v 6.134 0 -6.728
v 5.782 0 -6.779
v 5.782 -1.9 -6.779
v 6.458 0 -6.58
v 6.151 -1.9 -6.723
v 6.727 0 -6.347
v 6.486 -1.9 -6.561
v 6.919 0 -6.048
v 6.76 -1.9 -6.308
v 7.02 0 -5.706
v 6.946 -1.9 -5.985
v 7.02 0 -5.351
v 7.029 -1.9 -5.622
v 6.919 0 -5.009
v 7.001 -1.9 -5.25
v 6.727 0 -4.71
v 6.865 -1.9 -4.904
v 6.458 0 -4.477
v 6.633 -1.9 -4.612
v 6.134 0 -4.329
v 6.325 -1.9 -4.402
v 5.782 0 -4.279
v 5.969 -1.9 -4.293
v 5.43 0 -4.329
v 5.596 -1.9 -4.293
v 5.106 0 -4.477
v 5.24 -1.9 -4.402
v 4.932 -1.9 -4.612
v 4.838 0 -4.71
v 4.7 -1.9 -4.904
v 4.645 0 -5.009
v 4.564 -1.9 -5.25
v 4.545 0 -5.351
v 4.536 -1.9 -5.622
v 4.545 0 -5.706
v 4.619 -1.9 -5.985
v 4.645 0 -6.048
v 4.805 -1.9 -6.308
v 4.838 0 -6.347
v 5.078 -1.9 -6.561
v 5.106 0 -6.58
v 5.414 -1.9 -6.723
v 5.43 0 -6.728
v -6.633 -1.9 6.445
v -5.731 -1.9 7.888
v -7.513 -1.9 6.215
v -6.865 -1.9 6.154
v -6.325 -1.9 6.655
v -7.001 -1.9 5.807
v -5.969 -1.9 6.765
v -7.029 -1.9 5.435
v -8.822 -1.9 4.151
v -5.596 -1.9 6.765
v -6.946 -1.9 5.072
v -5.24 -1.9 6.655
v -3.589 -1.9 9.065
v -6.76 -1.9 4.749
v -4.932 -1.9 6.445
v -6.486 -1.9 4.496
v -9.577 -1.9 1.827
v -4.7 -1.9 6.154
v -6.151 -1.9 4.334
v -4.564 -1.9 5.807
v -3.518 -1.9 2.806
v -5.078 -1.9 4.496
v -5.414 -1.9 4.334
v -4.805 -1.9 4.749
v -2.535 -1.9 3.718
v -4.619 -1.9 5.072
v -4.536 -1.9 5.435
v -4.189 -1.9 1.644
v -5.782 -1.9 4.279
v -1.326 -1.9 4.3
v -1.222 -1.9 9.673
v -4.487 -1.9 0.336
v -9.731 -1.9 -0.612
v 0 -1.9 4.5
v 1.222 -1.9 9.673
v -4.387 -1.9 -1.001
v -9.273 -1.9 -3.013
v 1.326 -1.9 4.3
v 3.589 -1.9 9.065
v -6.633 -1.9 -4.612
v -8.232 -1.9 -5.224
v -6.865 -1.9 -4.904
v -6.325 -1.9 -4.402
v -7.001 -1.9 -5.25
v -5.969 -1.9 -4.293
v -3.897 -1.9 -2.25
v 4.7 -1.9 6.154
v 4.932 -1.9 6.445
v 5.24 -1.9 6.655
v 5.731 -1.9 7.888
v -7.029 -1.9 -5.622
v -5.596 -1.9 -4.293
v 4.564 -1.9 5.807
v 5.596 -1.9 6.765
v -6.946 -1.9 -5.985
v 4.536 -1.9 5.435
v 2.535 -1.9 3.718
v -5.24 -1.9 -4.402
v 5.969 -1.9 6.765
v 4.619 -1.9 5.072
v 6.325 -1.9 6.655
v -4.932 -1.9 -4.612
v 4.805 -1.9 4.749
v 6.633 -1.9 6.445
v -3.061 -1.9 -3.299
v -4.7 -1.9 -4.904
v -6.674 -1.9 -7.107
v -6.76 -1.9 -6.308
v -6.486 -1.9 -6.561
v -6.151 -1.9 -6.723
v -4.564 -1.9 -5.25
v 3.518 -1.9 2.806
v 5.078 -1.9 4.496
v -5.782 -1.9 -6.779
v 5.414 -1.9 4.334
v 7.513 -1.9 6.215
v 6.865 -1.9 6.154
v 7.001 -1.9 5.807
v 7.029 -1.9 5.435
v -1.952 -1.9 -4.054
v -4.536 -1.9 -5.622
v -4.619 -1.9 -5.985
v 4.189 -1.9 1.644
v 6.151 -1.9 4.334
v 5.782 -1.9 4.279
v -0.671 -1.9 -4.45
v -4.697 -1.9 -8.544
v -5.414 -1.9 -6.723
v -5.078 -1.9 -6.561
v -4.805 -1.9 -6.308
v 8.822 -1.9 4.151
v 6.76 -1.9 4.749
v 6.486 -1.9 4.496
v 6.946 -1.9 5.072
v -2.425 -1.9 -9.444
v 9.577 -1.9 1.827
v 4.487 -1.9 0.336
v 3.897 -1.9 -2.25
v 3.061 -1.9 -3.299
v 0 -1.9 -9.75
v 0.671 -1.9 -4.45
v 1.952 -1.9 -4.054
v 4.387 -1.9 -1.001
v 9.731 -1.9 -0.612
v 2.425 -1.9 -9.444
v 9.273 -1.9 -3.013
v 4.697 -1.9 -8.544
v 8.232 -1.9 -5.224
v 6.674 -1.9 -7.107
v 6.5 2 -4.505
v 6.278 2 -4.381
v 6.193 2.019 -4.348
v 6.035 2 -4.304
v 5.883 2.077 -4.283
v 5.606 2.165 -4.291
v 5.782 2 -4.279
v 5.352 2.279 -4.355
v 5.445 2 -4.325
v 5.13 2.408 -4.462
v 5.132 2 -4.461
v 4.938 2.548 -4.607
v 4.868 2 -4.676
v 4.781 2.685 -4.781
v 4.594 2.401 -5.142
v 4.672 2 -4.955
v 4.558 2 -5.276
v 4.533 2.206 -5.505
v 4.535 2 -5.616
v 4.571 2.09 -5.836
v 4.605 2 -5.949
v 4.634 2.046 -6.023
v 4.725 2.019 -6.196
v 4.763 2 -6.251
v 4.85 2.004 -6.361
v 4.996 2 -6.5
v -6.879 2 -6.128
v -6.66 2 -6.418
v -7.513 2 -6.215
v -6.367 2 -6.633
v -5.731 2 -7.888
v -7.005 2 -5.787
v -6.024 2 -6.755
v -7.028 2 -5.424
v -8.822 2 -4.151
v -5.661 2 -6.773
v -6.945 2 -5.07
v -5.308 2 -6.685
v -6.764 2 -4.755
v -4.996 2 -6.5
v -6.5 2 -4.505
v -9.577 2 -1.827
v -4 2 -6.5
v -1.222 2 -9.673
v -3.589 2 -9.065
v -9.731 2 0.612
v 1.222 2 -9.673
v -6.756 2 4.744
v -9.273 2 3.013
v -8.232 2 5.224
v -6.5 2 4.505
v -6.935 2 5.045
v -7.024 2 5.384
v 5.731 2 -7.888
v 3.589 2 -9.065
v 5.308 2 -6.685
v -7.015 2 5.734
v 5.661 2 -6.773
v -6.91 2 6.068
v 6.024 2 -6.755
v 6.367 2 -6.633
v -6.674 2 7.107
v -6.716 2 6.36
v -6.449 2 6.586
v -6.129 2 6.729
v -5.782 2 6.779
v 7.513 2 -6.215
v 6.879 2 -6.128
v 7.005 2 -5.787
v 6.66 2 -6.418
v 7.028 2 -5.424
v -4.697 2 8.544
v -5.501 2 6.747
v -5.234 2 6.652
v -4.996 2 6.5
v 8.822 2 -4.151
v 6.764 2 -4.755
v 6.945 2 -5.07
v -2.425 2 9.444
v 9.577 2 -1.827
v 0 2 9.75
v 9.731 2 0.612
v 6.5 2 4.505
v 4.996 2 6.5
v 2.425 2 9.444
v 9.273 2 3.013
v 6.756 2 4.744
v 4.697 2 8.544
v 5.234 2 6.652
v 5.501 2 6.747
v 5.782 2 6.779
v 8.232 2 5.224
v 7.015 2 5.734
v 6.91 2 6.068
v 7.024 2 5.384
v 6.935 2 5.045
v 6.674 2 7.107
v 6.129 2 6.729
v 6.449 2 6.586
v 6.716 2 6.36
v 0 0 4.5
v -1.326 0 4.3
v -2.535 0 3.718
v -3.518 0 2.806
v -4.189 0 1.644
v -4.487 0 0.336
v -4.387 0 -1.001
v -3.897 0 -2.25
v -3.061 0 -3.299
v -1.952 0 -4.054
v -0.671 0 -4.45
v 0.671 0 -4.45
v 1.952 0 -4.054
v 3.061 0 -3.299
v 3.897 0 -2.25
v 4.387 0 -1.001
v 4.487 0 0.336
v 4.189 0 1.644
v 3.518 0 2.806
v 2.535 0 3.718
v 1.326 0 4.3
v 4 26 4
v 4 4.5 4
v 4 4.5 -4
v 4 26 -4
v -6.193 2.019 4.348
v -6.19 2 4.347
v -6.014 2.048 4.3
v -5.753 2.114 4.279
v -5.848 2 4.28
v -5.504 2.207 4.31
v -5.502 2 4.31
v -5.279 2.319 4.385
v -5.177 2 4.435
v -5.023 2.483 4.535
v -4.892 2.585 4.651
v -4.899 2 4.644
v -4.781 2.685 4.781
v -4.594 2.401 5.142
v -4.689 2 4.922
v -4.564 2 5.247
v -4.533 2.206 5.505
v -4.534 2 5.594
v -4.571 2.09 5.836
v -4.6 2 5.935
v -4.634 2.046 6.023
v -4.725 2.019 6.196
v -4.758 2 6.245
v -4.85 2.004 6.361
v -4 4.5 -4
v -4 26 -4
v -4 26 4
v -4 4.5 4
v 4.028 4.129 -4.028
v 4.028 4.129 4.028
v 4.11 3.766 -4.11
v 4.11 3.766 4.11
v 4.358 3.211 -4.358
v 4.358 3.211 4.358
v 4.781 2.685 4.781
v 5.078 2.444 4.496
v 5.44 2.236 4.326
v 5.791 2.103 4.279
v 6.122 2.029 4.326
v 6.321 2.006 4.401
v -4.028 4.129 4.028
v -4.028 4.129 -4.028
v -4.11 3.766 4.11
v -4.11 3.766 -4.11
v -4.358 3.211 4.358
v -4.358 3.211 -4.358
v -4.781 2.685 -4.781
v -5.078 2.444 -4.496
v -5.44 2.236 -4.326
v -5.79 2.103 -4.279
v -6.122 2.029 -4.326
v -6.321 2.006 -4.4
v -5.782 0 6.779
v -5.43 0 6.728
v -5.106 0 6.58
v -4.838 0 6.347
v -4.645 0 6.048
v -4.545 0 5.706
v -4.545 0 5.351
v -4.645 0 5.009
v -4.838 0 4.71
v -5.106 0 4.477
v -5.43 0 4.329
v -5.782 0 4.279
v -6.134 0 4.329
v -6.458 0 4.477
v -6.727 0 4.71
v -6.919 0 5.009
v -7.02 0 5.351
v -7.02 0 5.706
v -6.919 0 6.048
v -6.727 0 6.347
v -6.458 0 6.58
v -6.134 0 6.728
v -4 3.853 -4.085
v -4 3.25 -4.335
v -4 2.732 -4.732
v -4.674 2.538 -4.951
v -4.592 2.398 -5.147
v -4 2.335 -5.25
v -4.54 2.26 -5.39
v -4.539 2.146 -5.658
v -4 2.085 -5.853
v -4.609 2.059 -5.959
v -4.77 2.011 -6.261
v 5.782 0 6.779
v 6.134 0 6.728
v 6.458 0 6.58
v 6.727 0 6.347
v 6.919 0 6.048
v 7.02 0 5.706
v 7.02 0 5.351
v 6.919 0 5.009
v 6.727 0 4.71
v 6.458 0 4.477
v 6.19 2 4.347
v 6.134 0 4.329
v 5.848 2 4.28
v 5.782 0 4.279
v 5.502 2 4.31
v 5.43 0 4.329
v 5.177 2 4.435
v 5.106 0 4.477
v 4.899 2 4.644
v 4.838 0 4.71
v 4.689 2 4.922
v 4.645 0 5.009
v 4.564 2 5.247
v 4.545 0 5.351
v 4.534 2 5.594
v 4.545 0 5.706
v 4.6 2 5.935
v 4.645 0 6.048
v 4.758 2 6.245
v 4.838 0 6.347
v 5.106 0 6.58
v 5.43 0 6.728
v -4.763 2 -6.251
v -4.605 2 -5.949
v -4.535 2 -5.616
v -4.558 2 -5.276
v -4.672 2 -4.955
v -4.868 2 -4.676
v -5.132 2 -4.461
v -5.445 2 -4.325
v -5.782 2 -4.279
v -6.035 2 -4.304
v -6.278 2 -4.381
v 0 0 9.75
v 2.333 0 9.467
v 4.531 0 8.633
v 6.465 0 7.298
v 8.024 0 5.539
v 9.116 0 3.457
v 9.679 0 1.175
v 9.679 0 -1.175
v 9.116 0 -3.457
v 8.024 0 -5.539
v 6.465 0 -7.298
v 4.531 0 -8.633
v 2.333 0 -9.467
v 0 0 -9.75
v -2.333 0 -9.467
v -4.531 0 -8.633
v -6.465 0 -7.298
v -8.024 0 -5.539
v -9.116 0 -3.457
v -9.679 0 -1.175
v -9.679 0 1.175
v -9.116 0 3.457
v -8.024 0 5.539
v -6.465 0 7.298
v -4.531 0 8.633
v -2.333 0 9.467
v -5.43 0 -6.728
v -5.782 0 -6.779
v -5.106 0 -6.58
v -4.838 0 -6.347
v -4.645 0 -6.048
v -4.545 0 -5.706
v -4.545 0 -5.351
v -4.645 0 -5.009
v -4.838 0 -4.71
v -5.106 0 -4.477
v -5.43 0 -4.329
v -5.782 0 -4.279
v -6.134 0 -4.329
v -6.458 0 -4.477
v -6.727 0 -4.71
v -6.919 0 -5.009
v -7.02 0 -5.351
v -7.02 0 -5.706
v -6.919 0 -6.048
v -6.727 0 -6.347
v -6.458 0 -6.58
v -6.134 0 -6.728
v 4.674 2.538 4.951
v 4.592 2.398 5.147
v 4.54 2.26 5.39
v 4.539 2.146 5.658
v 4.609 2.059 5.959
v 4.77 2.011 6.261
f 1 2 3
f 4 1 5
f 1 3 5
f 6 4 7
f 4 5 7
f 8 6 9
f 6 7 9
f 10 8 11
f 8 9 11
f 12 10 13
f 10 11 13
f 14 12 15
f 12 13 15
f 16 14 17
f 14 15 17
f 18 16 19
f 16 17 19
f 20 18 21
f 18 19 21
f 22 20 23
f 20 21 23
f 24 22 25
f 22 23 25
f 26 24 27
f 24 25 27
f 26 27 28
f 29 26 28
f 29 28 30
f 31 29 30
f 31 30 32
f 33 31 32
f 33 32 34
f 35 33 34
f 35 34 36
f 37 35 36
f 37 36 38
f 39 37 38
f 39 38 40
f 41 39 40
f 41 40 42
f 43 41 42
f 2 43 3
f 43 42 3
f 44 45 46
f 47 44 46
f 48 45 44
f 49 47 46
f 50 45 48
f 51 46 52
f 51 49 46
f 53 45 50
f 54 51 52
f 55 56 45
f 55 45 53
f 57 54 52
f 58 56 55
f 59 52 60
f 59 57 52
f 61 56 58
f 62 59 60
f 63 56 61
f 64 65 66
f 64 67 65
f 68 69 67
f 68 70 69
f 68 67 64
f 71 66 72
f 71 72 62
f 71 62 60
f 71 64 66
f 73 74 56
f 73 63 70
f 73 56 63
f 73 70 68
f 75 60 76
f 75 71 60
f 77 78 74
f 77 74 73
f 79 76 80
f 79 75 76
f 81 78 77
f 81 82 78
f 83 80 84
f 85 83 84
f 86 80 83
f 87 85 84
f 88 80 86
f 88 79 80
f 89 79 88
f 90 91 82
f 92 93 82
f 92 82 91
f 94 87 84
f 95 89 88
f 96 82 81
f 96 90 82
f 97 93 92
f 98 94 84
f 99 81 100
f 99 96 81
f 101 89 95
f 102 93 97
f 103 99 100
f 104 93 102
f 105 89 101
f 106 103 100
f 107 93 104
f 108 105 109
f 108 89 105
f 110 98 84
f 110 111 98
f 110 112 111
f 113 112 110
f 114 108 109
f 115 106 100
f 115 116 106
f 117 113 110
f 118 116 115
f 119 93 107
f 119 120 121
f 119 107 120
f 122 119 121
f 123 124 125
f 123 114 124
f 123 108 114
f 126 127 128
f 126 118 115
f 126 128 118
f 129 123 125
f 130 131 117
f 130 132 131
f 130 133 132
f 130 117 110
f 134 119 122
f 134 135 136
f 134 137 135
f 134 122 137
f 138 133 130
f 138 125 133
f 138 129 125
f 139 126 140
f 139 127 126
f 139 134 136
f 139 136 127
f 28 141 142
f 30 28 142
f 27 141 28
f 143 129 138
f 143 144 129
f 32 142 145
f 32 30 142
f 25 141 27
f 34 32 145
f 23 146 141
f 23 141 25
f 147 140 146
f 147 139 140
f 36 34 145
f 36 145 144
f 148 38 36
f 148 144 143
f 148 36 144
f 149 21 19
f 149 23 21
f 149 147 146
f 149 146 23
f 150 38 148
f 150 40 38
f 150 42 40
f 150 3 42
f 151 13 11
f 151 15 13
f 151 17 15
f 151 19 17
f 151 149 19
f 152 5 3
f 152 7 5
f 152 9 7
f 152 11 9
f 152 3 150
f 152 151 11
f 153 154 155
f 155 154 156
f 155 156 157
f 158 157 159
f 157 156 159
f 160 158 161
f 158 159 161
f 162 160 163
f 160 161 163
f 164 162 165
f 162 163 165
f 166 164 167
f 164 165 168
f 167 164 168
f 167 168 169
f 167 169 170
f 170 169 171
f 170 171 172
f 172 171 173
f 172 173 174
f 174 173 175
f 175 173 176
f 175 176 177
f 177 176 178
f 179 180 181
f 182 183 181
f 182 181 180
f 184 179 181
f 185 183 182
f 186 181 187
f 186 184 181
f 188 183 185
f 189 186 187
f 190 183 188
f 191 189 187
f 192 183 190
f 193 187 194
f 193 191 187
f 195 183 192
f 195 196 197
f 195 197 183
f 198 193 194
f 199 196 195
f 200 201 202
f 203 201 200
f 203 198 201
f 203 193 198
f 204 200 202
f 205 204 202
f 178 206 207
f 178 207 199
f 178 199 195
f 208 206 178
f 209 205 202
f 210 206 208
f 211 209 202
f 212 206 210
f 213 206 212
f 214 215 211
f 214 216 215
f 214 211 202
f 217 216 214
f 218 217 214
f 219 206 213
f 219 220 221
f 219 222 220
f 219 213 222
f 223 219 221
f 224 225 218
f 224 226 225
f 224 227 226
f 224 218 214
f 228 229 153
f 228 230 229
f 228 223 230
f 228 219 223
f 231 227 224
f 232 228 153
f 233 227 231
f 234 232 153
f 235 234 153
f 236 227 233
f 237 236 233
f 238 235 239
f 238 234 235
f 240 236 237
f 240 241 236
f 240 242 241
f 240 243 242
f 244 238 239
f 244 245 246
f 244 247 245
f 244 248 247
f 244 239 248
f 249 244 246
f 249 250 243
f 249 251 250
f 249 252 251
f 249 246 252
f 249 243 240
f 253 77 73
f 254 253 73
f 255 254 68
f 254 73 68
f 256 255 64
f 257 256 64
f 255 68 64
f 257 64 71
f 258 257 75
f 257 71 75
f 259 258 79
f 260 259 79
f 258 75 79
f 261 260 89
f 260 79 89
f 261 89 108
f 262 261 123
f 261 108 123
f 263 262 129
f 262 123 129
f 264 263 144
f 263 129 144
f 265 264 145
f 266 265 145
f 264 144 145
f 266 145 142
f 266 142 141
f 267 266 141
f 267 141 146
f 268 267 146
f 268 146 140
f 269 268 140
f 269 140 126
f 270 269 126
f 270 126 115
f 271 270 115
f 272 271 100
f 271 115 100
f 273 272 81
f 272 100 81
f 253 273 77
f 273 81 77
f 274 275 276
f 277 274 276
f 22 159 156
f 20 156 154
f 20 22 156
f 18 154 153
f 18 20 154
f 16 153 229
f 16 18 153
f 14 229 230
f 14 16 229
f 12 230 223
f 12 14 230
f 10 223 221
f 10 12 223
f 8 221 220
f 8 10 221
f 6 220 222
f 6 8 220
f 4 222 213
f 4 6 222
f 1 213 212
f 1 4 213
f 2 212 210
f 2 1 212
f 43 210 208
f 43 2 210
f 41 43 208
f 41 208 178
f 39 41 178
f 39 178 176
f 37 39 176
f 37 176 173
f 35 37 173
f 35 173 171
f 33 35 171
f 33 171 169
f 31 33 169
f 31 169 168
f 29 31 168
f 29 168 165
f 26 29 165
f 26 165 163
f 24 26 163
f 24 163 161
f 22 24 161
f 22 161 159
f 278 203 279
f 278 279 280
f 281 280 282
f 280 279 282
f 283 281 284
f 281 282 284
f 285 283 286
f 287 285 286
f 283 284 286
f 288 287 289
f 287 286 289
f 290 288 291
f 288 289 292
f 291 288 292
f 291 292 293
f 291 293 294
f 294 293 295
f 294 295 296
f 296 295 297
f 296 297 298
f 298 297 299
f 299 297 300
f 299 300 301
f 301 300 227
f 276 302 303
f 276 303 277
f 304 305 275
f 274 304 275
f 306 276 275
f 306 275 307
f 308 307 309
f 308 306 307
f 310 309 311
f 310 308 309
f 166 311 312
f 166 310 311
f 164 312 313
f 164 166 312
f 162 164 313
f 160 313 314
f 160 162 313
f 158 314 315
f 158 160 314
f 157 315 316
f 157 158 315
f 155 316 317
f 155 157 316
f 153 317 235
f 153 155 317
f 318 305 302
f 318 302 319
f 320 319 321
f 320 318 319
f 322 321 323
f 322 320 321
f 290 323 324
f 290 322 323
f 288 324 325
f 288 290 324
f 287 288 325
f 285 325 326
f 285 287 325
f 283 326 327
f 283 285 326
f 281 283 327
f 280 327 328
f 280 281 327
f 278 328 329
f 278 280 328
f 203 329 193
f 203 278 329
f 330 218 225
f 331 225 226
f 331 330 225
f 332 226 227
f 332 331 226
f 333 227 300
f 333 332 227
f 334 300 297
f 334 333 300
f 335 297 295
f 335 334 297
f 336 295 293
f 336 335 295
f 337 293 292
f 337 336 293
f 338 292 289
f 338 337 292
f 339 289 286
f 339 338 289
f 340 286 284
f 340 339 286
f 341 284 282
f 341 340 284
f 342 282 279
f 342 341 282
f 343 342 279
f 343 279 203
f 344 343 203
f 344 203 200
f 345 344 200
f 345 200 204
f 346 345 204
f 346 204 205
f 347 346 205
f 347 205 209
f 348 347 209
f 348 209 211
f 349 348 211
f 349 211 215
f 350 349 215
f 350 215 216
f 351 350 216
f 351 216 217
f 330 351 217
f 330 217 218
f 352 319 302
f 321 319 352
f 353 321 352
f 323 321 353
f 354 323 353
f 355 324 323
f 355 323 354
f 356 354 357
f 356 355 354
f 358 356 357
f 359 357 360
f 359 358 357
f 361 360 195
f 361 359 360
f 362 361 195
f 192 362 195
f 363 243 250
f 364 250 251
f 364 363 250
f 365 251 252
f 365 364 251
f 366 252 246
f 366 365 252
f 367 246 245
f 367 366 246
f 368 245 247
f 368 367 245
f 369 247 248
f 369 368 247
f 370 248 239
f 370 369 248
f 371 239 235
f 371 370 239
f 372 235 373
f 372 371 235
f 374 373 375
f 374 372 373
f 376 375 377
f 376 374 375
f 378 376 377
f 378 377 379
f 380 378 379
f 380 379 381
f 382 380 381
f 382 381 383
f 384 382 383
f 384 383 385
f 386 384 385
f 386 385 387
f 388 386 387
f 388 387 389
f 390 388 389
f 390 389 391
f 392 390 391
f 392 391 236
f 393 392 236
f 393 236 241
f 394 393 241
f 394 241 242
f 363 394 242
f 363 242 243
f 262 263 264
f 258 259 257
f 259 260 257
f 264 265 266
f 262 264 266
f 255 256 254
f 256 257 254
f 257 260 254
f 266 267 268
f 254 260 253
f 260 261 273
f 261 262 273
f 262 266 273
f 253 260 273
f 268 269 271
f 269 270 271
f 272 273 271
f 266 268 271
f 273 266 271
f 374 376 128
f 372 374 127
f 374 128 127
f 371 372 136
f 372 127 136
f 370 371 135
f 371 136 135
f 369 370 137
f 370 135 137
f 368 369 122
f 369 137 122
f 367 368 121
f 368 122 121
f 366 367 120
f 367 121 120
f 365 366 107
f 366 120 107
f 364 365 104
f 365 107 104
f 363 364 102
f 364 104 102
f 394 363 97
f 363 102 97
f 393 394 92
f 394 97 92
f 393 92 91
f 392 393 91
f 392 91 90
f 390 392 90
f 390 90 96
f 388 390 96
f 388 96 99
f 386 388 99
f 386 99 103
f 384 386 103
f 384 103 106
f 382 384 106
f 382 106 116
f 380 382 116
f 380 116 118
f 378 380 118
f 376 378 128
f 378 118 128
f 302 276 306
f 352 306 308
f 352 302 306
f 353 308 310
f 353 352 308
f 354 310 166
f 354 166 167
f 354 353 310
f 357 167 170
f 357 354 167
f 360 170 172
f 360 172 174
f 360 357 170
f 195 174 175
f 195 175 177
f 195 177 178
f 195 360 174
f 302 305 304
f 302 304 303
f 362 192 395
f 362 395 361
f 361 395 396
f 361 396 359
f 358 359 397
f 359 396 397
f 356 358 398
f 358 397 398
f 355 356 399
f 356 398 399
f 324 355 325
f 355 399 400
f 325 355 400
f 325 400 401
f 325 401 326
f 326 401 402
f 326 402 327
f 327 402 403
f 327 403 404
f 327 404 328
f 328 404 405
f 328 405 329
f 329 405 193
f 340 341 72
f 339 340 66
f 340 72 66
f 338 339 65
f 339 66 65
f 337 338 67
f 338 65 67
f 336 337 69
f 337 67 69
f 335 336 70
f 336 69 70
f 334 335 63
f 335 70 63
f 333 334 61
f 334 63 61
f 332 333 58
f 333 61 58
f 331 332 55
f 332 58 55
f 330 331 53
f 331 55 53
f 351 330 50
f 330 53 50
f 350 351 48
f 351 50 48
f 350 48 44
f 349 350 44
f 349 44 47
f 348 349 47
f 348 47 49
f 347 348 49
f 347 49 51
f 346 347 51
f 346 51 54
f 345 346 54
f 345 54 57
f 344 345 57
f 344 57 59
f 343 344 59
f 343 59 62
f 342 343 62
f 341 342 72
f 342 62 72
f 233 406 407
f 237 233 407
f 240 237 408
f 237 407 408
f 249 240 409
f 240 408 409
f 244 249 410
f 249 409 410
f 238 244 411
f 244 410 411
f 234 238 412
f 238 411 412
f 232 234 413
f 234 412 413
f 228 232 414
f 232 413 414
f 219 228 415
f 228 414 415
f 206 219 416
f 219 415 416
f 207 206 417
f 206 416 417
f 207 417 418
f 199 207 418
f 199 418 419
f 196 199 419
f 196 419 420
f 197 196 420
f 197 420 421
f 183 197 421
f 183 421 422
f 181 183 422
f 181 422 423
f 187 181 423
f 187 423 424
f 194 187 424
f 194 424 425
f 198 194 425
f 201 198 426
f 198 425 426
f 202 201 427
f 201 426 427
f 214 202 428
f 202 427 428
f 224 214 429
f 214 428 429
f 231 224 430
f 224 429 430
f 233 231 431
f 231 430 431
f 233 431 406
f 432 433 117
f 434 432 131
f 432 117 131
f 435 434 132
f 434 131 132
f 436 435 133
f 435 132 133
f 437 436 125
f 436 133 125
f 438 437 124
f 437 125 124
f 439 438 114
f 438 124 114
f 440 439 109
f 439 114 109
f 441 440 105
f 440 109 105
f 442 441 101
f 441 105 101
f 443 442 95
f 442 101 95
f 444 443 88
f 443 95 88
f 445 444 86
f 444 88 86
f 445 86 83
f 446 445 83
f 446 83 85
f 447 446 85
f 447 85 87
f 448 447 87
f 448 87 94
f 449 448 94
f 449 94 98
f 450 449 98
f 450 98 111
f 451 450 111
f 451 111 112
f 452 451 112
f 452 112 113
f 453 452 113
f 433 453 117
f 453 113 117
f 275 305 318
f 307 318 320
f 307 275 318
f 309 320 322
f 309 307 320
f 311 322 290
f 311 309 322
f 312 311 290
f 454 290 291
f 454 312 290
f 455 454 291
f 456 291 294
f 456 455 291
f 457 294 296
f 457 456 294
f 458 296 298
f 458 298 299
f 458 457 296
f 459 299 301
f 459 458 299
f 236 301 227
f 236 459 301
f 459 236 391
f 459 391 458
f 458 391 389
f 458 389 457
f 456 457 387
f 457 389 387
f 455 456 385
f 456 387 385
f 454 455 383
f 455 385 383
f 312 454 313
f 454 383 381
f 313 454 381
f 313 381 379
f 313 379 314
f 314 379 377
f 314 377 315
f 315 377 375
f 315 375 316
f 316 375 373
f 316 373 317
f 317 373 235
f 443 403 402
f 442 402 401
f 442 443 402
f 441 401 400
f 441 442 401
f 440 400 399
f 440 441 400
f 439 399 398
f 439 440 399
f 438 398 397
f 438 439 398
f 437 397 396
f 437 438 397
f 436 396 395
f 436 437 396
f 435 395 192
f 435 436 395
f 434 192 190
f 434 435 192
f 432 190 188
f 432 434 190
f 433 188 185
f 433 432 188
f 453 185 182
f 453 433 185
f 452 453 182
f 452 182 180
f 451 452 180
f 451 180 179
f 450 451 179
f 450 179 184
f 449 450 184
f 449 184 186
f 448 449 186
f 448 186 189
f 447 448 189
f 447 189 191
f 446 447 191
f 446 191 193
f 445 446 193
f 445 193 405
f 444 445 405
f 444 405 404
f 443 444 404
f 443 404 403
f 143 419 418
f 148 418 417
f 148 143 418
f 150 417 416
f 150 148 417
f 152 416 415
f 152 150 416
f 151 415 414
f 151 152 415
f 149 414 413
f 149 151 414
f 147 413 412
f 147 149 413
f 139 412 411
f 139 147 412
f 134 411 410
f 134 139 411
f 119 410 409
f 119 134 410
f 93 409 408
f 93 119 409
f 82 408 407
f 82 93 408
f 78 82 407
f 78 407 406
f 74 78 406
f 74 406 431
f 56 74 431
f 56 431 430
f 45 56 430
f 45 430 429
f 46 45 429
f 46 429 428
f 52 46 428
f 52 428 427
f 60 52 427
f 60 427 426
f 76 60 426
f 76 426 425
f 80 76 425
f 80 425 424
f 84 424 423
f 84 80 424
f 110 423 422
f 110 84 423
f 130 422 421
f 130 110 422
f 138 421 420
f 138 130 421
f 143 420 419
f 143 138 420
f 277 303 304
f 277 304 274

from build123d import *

# Parameters (mm, degrees)
SKETCH1_R           = 9.75
SKETCH1_R_2         = 1.25
BOSS_EXTRUDE2_DEPTH = 2
SKETCH2_W           = 8
SKETCH2_H           = 8
BOSS_EXTRUDE3_DEPTH = 24
BOSS_EXTRUDE5_START = 1.9
SKETCH7_R           = 9.75
SKETCH7_R_2         = 4.5
SKETCH7_R_3         = 1.25
BOSS_EXTRUDE5_DEPTH = 1.9
FILLET1_R           = 2.5


with BuildPart() as part:
    # Sketch1 → Boss-Extrude2 (new body)
    with BuildSketch(Plane(origin=(0, 0, 0), x_dir=(1, 0, 0), z_dir=(0, 1, 0))):
        with Locations(Location((0, 0, 0), (0, 0, 270))):
            Circle(SKETCH1_R)
        with Locations(Location((-5.78230038, 5.52856241, 0), (0, 0, 270))):
            Circle(SKETCH1_R_2, mode=Mode.SUBTRACT)
        with Locations(Location((-5.78230038, -5.52856241, 0), (0, 0, 270))):
            Circle(SKETCH1_R_2, mode=Mode.SUBTRACT)
        with Locations(Location((5.78230038, -5.52856241, 0), (0, 0, 270))):
            Circle(SKETCH1_R_2, mode=Mode.SUBTRACT)
        with Locations(Location((5.78230038, 5.52856241, 0), (0, 0, 270))):
            Circle(SKETCH1_R_2, mode=Mode.SUBTRACT)
    extrude(amount=BOSS_EXTRUDE2_DEPTH)

    # Sketch2 → Boss-Extrude3 (add)
    with BuildSketch(Plane(origin=(0, 2, 0), x_dir=(1, 0, 0), z_dir=(0, 1, 0))):
        Rectangle(SKETCH2_W, SKETCH2_H)
    extrude(amount=BOSS_EXTRUDE3_DEPTH)

    # Sketch7 → Boss-Extrude5 (add)
    with BuildSketch(Plane.XZ.offset(BOSS_EXTRUDE5_START)):
        with Locations(Location((0, 0, 0), (0, 0, 270))):
            Circle(SKETCH7_R)
        with Locations(Location((0, 0, 0), (0, 0, 90))):
            Circle(SKETCH7_R_2, mode=Mode.SUBTRACT)
        with Locations(Location((-5.78230038, 5.52856241, 0), (0, 0, 270))):
            Circle(SKETCH7_R_3, mode=Mode.SUBTRACT)
        with Locations(Location((5.78230038, 5.52856241, 0), (0, 0, 270))):
            Circle(SKETCH7_R_3, mode=Mode.SUBTRACT)
        with Locations(Location((5.78230038, -5.52856241, 0), (0, 0, 270))):
            Circle(SKETCH7_R_3, mode=Mode.SUBTRACT)
        with Locations(Location((-5.78230038, -5.52856241, 0), (0, 0, 270))):
            Circle(SKETCH7_R_3, mode=Mode.SUBTRACT)
    extrude(amount=-BOSS_EXTRUDE5_DEPTH)

    # Fillet1
    # the kernel refuses this fillet: 2.5 mm, written as the material it adds along each edge
    with BuildSketch(Plane(origin=(4, 2, -4), x_dir=(1, 0, 0), z_dir=(0, 0, 1)), Plane(origin=(-4, 2, -4), x_dir=(0, 0, -1), z_dir=(1, 0, 0)), Plane(origin=(4, 2, 4), x_dir=(0, 0, 1), z_dir=(-1, 0, 0)), Plane(origin=(-4, 2, 4), x_dir=(-1, 0, 0), z_dir=(0, 0, -1))) as fillet1_piece_1:
        with BuildLine():
            CenterArc((FILLET1_R, FILLET1_R), FILLET1_R, 180, 90)
            Line((0, FILLET1_R), (0, 0))
            Line((0, 0), (FILLET1_R, 0))
        make_face()
    extrude(amount=8)
    with BuildSketch(Plane(origin=(4, 2, -10.25), x_dir=(1, 0, 0), z_dir=(0, 0, 1))) as fillet1_piece_2a_section:
        with BuildLine():
            CenterArc((FILLET1_R, FILLET1_R), FILLET1_R, 180, 90)
            Line((0, FILLET1_R), (0, 0))
            Line((0, 0), (FILLET1_R, 0))
        make_face()
    fillet1_piece_2a = extrude(amount=14.25, mode=Mode.PRIVATE)
    fillet1_piece_2a = fillet1_piece_2a & Plane(origin=(0, 2.663763666, 0), x_dir=(0, 0, 1), z_dir=(0, -1, 0)) * Cylinder(9.75, 39, mode=Mode.PRIVATE)
    fillet1_piece_2a = fillet1_piece_2a - Plane(origin=(5.78230038, 2.663763666, -5.52856241), x_dir=(0, 0, 1), z_dir=(0, -1, 0)) * Cylinder(1.25, 39, mode=Mode.PRIVATE)
    fillet1_piece_2a = split(fillet1_piece_2a, bisect_by=Plane(origin=(4.398974619, 2.663763666, -4), z_dir=(0, 0, -1)), keep=Keep.TOP, mode=Mode.PRIVATE)
    with BuildSketch(Plane(origin=(-4, 2, -4), x_dir=(0, 0, -1), z_dir=(1, 0, 0))) as fillet1_piece_2b_section:
        with BuildLine():
            CenterArc((FILLET1_R, FILLET1_R), FILLET1_R, 180, 90)
            Line((0, FILLET1_R), (0, 0))
            Line((0, 0), (FILLET1_R, 0))
        make_face()
    fillet1_piece_2b = extrude(amount=14.25, mode=Mode.PRIVATE)
    fillet1_piece_2b = fillet1_piece_2b & Plane(origin=(0, 2.68491829, 0), x_dir=(0, 0, 1), z_dir=(0, -1, 0)) * Cylinder(9.75, 39, mode=Mode.PRIVATE)
    fillet1_piece_2b = fillet1_piece_2b - Plane(origin=(5.78230038, 2.68491829, -5.52856241), x_dir=(0, 0, 1), z_dir=(0, -1, 0)) * Cylinder(1.25, 39, mode=Mode.PRIVATE)
    fillet1_piece_2b = split(fillet1_piece_2b, bisect_by=Plane(origin=(4, 2.68491829, -4.384125447), z_dir=(1, 0, 0)), keep=Keep.TOP, mode=Mode.PRIVATE)
    fillet1_piece_2 = fillet1_piece_2a & fillet1_piece_2b
    add(fillet1_piece_2)
    with BuildSketch(Plane(origin=(10.25, 2, 4), x_dir=(0, 0, 1), z_dir=(-1, 0, 0))) as fillet1_piece_3a_section:
        with BuildLine():
            CenterArc((FILLET1_R, FILLET1_R), FILLET1_R, 180, 90)
            Line((0, FILLET1_R), (0, 0))
            Line((0, 0), (FILLET1_R, 0))
        make_face()
    fillet1_piece_3a = extrude(amount=14.25, mode=Mode.PRIVATE)
    fillet1_piece_3a = fillet1_piece_3a & Plane(origin=(0, 2.684921118, 0), x_dir=(0, 0, 1), z_dir=(0, -1, 0)) * Cylinder(9.75, 39, mode=Mode.PRIVATE)
    fillet1_piece_3a = fillet1_piece_3a - Plane(origin=(5.78230038, 2.684921118, 5.52856241), x_dir=(0, 0, 1), z_dir=(0, -1, 0)) * Cylinder(1.25, 39, mode=Mode.PRIVATE)
    fillet1_piece_3a = split(fillet1_piece_3a, bisect_by=Plane(origin=(4, 2.684921118, 4.384140978), z_dir=(1, 0, 0)), keep=Keep.TOP, mode=Mode.PRIVATE)
    with BuildSketch(Plane(origin=(4, 2, -4), x_dir=(1, 0, 0), z_dir=(0, 0, 1))) as fillet1_piece_3b_section:
        with BuildLine():
            CenterArc((FILLET1_R, FILLET1_R), FILLET1_R, 180, 90)
            Line((0, FILLET1_R), (0, 0))
            Line((0, 0), (FILLET1_R, 0))
        make_face()
    fillet1_piece_3b = extrude(amount=14.25, mode=Mode.PRIVATE)
    fillet1_piece_3b = fillet1_piece_3b & Plane(origin=(0, 2.663763629, 0), x_dir=(0, 0, 1), z_dir=(0, -1, 0)) * Cylinder(9.75, 39, mode=Mode.PRIVATE)
    fillet1_piece_3b = fillet1_piece_3b - Plane(origin=(5.78230038, 2.663763629, 5.52856241), x_dir=(0, 0, 1), z_dir=(0, -1, 0)) * Cylinder(1.25, 39, mode=Mode.PRIVATE)
    fillet1_piece_3b = split(fillet1_piece_3b, bisect_by=Plane(origin=(4.398975598, 2.663763629, 4), z_dir=(0, 0, 1)), keep=Keep.TOP, mode=Mode.PRIVATE)
    fillet1_piece_3 = fillet1_piece_3a & fillet1_piece_3b
    add(fillet1_piece_3)
    with BuildSketch(Plane(origin=(-4, 2, 4), x_dir=(-1, 0, 0), z_dir=(0, 0, -1))) as fillet1_piece_4a_section:
        with BuildLine():
            CenterArc((FILLET1_R, FILLET1_R), FILLET1_R, 180, 90)
            Line((0, FILLET1_R), (0, 0))
            Line((0, 0), (FILLET1_R, 0))
        make_face()
    fillet1_piece_4a = extrude(amount=14.25, mode=Mode.PRIVATE)
    fillet1_piece_4a = fillet1_piece_4a & Plane(origin=(0, 2.663765474, 0), x_dir=(0, 0, 1), z_dir=(0, -1, 0)) * Cylinder(9.75, 39, mode=Mode.PRIVATE)
    fillet1_piece_4a = fillet1_piece_4a - Plane(origin=(-5.78230038, 2.663765474, -5.52856241), x_dir=(0, 0, 1), z_dir=(0, -1, 0)) * Cylinder(1.25, 39, mode=Mode.PRIVATE)
    fillet1_piece_4a = split(fillet1_piece_4a, bisect_by=Plane(origin=(-4.39896904, 2.663765474, -4), z_dir=(0, 0, -1)), keep=Keep.TOP, mode=Mode.PRIVATE)
    with BuildSketch(Plane(origin=(-10.25, 2, -4), x_dir=(0, 0, -1), z_dir=(1, 0, 0))) as fillet1_piece_4b_section:
        with BuildLine():
            CenterArc((FILLET1_R, FILLET1_R), FILLET1_R, 180, 90)
            Line((0, FILLET1_R), (0, 0))
            Line((0, 0), (FILLET1_R, 0))
        make_face()
    fillet1_piece_4b = extrude(amount=14.25, mode=Mode.PRIVATE)
    fillet1_piece_4b = fillet1_piece_4b & Plane(origin=(0, 2.684918127, 0), x_dir=(0, 0, 1), z_dir=(0, -1, 0)) * Cylinder(9.75, 39, mode=Mode.PRIVATE)
    fillet1_piece_4b = fillet1_piece_4b - Plane(origin=(-5.78230038, 2.684918127, -5.52856241), x_dir=(0, 0, 1), z_dir=(0, -1, 0)) * Cylinder(1.25, 39, mode=Mode.PRIVATE)
    fillet1_piece_4b = split(fillet1_piece_4b, bisect_by=Plane(origin=(-4, 2.684918127, -4.384124985), z_dir=(-1, 0, 0)), keep=Keep.TOP, mode=Mode.PRIVATE)
    fillet1_piece_4 = fillet1_piece_4a & fillet1_piece_4b
    add(fillet1_piece_4)
    with BuildSketch(Plane(origin=(-4, 2, 10.25), x_dir=(-1, 0, 0), z_dir=(0, 0, -1))) as fillet1_piece_5a_section:
        with BuildLine():
            CenterArc((FILLET1_R, FILLET1_R), FILLET1_R, 180, 90)
            Line((0, FILLET1_R), (0, 0))
            Line((0, 0), (FILLET1_R, 0))
        make_face()
    fillet1_piece_5a = extrude(amount=14.25, mode=Mode.PRIVATE)
    fillet1_piece_5a = fillet1_piece_5a & Plane(origin=(0, 2.66376539, 0), x_dir=(0, 0, 1), z_dir=(0, -1, 0)) * Cylinder(9.75, 39, mode=Mode.PRIVATE)
    fillet1_piece_5a = fillet1_piece_5a - Plane(origin=(-5.78230038, 2.66376539, 5.52856241), x_dir=(0, 0, 1), z_dir=(0, -1, 0)) * Cylinder(1.25, 39, mode=Mode.PRIVATE)
    fillet1_piece_5a = split(fillet1_piece_5a, bisect_by=Plane(origin=(-4.398969268, 2.66376539, 4), z_dir=(0, 0, 1)), keep=Keep.TOP, mode=Mode.PRIVATE)
    with BuildSketch(Plane(origin=(4, 2, 4), x_dir=(0, 0, 1), z_dir=(-1, 0, 0))) as fillet1_piece_5b_section:
        with BuildLine():
            CenterArc((FILLET1_R, FILLET1_R), FILLET1_R, 180, 90)
            Line((0, FILLET1_R), (0, 0))
            Line((0, 0), (FILLET1_R, 0))
        make_face()
    fillet1_piece_5b = extrude(amount=14.25, mode=Mode.PRIVATE)
    fillet1_piece_5b = fillet1_piece_5b & Plane(origin=(0, 2.684921922, 0), x_dir=(0, 0, 1), z_dir=(0, -1, 0)) * Cylinder(9.75, 39, mode=Mode.PRIVATE)
    fillet1_piece_5b = fillet1_piece_5b - Plane(origin=(-5.78230038, 2.684921922, 5.52856241), x_dir=(0, 0, 1), z_dir=(0, -1, 0)) * Cylinder(1.25, 39, mode=Mode.PRIVATE)
    fillet1_piece_5b = split(fillet1_piece_5b, bisect_by=Plane(origin=(-4, 2.684921922, 4.384144633), z_dir=(-1, 0, 0)), keep=Keep.TOP, mode=Mode.PRIVATE)
    fillet1_piece_5 = fillet1_piece_5a & fillet1_piece_5b
    add(fillet1_piece_5)


solid = part.part
